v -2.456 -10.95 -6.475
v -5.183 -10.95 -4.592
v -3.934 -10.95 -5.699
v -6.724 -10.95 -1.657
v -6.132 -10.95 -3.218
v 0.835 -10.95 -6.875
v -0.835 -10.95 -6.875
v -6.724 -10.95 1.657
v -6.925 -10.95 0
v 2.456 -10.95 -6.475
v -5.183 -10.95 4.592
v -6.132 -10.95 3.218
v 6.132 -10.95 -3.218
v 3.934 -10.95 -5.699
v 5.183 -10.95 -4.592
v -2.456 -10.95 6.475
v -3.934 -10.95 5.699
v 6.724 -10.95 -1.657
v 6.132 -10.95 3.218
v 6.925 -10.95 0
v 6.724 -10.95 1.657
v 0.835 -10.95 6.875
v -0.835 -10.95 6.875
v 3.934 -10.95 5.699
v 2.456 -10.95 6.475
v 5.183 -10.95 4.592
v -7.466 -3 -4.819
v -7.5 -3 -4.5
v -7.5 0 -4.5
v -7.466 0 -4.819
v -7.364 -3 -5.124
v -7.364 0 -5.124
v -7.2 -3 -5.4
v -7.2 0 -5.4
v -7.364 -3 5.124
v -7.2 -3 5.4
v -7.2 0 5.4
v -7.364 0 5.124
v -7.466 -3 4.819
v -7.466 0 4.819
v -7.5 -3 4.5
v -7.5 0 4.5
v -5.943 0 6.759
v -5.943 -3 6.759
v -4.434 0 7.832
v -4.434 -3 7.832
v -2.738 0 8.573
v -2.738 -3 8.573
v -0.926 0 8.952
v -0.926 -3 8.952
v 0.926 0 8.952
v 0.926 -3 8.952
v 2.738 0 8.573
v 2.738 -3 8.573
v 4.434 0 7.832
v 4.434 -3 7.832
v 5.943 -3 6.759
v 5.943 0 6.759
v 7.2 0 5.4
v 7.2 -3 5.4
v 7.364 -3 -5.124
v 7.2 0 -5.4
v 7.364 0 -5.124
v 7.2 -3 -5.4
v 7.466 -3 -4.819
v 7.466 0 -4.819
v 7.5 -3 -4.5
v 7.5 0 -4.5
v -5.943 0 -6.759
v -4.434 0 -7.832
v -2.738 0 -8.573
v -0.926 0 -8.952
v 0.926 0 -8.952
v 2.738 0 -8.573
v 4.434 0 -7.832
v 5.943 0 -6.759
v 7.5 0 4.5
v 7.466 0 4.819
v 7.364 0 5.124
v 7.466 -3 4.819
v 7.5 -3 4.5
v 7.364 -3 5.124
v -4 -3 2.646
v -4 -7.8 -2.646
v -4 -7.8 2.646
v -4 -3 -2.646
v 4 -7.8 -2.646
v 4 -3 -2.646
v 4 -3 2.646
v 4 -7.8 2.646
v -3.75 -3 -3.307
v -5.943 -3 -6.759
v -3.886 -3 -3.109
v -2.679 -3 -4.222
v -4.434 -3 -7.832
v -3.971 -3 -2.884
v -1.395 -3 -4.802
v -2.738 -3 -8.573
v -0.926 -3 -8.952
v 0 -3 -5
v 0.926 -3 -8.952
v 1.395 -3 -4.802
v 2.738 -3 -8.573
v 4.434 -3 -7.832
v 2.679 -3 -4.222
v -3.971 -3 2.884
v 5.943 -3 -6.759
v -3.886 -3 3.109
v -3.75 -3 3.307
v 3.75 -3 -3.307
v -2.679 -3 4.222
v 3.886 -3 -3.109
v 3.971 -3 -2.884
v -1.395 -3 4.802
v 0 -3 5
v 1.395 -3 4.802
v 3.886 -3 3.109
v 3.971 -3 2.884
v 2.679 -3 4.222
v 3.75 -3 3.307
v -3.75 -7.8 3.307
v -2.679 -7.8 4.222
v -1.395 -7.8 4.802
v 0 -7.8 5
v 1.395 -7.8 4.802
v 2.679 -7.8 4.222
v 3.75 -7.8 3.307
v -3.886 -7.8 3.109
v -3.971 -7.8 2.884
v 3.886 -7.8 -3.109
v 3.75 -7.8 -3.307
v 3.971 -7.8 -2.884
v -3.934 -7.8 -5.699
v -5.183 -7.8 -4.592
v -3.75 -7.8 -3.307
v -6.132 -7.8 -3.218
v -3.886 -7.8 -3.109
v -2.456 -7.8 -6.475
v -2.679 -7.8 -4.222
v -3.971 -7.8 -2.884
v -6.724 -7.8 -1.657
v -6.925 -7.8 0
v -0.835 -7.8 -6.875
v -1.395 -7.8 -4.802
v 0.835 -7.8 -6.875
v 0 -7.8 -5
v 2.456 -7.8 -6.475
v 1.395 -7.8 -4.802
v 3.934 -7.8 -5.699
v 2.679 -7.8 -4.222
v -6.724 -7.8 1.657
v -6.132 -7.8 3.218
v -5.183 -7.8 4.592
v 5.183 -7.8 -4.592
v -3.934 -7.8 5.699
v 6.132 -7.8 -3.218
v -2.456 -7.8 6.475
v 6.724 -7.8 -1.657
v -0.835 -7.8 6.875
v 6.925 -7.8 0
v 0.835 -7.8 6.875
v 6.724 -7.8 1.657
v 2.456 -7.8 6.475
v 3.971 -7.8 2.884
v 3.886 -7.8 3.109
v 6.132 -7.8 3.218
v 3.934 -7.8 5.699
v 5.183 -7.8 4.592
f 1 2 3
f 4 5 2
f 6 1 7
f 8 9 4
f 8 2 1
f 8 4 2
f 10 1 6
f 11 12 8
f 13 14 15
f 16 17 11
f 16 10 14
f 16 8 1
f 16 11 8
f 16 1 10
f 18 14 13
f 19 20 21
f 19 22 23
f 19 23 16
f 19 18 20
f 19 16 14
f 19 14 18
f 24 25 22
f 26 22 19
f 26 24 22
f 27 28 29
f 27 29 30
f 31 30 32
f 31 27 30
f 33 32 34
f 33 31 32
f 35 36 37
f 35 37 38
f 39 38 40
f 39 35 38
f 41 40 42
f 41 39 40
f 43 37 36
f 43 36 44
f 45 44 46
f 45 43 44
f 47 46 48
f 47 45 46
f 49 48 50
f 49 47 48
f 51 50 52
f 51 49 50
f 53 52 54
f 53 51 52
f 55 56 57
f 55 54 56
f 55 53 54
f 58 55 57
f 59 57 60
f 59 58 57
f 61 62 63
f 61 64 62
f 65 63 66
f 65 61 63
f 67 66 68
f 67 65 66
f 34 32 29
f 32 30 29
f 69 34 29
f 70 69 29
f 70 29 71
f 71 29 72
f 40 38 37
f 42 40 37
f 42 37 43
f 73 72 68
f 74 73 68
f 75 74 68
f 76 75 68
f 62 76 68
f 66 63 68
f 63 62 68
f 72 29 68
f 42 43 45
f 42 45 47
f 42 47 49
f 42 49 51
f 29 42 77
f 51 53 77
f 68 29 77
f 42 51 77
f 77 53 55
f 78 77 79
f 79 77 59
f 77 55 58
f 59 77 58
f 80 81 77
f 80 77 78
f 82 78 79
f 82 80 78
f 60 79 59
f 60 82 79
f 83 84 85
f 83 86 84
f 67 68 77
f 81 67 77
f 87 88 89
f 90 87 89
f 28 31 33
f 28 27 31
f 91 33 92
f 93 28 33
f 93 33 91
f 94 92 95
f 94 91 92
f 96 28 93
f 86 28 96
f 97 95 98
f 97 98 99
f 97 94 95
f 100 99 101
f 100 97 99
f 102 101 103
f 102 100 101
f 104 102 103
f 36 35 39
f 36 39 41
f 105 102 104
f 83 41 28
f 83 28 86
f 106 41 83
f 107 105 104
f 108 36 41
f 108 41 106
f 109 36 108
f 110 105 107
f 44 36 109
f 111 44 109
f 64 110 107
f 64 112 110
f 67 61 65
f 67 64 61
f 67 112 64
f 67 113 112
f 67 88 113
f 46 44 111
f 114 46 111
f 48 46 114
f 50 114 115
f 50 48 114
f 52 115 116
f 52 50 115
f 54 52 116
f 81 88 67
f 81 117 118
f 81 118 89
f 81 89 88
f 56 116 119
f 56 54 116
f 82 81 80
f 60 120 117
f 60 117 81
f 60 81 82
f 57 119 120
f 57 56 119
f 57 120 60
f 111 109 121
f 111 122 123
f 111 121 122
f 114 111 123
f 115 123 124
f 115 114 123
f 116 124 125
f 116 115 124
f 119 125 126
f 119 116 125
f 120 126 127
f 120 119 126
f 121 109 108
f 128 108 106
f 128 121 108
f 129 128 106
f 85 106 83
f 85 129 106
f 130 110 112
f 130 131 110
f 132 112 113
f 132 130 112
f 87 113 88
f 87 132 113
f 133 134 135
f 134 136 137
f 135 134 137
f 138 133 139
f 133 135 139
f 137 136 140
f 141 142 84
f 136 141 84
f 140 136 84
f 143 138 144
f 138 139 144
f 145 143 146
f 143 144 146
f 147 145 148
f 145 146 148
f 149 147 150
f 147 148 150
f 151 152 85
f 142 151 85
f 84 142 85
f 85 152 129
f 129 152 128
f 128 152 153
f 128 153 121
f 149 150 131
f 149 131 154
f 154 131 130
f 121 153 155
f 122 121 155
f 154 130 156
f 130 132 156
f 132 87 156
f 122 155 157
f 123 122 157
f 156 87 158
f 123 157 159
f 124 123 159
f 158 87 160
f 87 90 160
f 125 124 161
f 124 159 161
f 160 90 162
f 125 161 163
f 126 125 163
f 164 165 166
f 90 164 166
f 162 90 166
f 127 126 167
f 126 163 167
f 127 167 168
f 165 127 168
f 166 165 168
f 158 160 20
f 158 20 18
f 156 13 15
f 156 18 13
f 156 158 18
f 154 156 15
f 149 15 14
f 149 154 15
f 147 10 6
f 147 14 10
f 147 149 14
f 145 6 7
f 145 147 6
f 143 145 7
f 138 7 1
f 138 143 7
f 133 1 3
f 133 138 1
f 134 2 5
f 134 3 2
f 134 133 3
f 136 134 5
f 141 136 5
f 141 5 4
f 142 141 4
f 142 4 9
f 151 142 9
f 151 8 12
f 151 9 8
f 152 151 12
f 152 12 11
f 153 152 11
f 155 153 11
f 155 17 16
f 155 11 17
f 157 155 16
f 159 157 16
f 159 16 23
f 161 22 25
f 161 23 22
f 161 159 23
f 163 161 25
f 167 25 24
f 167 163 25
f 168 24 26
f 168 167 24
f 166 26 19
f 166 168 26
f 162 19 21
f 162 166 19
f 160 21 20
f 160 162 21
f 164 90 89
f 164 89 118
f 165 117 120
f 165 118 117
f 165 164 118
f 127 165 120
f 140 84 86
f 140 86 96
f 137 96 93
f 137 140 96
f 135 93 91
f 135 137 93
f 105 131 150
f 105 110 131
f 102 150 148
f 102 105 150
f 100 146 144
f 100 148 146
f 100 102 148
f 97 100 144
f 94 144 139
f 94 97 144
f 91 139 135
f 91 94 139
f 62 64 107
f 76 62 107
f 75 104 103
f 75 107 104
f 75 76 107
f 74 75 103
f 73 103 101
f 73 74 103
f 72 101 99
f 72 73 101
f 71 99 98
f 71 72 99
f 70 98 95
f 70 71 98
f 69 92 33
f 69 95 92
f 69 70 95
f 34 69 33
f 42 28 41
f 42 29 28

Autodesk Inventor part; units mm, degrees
ref_plane "YZ Plane" through (0, 0, 0) normal (1, 0, 0) x (0, 1, 0)
ref_plane "XZ Plane" through (0, 0, 0) normal (0, 1, 0) x (-1, 0, 0)
ref_plane "XY Plane" through (0, 0, 0) normal (0, 0, 1) x (1, 0, 0)
sketch "Sketch1" plane through (0, 0, 0) normal (0, 0, 1) x (1, 0, 0)
  line L0 (0, 0) -> (0, -10.95)
  line L1 (0, -10.95) -> (6.925, -10.95)
  line L2 (6.925, -10.95) -> (6.925, -7.8)
  line L3 (6.925, -7.8) -> (5, -7.8)
  line L4 (5, -7.8) -> (5, -3)
  line L5 (5, -3) -> (9, -3)
  line L6 (9, -3) -> (9, 0)
  line L7 (9, 0) -> (0, 0)
  dimension "d0" = 6.925
  dimension "d1" = 5
  dimension "d2" = 9
  dimension "d3" = 3.15
  dimension "d4" = 4.8
  dimension "d5" = 3
revolve "Revolution1" add sketch "Sketch1" angle 360 about axis through (0, 0, 0) along (0, -1, 0)
sketch "Sketch2" plane through (0, 0, 0) normal (0, 1, 0) x (1, 0, 0)
  circle A0 centre (0, 0) radius 9 projected
  line L0 (0, 12.6) -> (0, -12.6) projected
  line L1 (7.5, 4.9749) -> (7.5, -4.9749)
  line L2 (-7.5, 4.9749) -> (-7.5, -4.9749)
  dimension "d7" = 15
  dimension "d8" = 7.5
extrude "Extrusion1" cut sketch "Sketch2" against normal up to surface (3 mm away) contours A0 L1 | L2 A0
sketch "Sketch3" plane through (0, -3, 0) normal (0, -1, 0) x (1, 0, 0)
  arc A0 (-7.5, -4.9749) -> (7.5, -4.9749) centre (0, 0) ccw projected
  line L0 (7.5, -4.9749) -> (7.5, 4.9749) projected
  circle A1 centre (0, 0) radius 5 projected
  line L1 (-4, -3) -> (-4, 3)
  line L2 (4, -3) -> (4, 3)
  dimension "d11" = 8
  dimension "d12" = 4
extrude "Extrusion2" cut sketch "Sketch3" along normal up to surface (4.8 mm away) contours A1 L2 | L1 A1
fillet "Fillet1" radius 1 4 edges at (4, -5.4, 3) (4, -5.4, -3) (-4, -5.4, 3) (-4, -5.4, -3)
fillet "Fillet2" radius 1.5 4 edges at (7.5, -1.5, 4.9749) (7.5, -1.5, -4.9749) (-7.5, -1.5, 4.9749) (-7.5, -1.5, -4.9749)
equation "\"d8\" = 0.5 * d7"
equation "\"d12\" = 0.5 * d11"
properties part number "318-06" material "Steel"
